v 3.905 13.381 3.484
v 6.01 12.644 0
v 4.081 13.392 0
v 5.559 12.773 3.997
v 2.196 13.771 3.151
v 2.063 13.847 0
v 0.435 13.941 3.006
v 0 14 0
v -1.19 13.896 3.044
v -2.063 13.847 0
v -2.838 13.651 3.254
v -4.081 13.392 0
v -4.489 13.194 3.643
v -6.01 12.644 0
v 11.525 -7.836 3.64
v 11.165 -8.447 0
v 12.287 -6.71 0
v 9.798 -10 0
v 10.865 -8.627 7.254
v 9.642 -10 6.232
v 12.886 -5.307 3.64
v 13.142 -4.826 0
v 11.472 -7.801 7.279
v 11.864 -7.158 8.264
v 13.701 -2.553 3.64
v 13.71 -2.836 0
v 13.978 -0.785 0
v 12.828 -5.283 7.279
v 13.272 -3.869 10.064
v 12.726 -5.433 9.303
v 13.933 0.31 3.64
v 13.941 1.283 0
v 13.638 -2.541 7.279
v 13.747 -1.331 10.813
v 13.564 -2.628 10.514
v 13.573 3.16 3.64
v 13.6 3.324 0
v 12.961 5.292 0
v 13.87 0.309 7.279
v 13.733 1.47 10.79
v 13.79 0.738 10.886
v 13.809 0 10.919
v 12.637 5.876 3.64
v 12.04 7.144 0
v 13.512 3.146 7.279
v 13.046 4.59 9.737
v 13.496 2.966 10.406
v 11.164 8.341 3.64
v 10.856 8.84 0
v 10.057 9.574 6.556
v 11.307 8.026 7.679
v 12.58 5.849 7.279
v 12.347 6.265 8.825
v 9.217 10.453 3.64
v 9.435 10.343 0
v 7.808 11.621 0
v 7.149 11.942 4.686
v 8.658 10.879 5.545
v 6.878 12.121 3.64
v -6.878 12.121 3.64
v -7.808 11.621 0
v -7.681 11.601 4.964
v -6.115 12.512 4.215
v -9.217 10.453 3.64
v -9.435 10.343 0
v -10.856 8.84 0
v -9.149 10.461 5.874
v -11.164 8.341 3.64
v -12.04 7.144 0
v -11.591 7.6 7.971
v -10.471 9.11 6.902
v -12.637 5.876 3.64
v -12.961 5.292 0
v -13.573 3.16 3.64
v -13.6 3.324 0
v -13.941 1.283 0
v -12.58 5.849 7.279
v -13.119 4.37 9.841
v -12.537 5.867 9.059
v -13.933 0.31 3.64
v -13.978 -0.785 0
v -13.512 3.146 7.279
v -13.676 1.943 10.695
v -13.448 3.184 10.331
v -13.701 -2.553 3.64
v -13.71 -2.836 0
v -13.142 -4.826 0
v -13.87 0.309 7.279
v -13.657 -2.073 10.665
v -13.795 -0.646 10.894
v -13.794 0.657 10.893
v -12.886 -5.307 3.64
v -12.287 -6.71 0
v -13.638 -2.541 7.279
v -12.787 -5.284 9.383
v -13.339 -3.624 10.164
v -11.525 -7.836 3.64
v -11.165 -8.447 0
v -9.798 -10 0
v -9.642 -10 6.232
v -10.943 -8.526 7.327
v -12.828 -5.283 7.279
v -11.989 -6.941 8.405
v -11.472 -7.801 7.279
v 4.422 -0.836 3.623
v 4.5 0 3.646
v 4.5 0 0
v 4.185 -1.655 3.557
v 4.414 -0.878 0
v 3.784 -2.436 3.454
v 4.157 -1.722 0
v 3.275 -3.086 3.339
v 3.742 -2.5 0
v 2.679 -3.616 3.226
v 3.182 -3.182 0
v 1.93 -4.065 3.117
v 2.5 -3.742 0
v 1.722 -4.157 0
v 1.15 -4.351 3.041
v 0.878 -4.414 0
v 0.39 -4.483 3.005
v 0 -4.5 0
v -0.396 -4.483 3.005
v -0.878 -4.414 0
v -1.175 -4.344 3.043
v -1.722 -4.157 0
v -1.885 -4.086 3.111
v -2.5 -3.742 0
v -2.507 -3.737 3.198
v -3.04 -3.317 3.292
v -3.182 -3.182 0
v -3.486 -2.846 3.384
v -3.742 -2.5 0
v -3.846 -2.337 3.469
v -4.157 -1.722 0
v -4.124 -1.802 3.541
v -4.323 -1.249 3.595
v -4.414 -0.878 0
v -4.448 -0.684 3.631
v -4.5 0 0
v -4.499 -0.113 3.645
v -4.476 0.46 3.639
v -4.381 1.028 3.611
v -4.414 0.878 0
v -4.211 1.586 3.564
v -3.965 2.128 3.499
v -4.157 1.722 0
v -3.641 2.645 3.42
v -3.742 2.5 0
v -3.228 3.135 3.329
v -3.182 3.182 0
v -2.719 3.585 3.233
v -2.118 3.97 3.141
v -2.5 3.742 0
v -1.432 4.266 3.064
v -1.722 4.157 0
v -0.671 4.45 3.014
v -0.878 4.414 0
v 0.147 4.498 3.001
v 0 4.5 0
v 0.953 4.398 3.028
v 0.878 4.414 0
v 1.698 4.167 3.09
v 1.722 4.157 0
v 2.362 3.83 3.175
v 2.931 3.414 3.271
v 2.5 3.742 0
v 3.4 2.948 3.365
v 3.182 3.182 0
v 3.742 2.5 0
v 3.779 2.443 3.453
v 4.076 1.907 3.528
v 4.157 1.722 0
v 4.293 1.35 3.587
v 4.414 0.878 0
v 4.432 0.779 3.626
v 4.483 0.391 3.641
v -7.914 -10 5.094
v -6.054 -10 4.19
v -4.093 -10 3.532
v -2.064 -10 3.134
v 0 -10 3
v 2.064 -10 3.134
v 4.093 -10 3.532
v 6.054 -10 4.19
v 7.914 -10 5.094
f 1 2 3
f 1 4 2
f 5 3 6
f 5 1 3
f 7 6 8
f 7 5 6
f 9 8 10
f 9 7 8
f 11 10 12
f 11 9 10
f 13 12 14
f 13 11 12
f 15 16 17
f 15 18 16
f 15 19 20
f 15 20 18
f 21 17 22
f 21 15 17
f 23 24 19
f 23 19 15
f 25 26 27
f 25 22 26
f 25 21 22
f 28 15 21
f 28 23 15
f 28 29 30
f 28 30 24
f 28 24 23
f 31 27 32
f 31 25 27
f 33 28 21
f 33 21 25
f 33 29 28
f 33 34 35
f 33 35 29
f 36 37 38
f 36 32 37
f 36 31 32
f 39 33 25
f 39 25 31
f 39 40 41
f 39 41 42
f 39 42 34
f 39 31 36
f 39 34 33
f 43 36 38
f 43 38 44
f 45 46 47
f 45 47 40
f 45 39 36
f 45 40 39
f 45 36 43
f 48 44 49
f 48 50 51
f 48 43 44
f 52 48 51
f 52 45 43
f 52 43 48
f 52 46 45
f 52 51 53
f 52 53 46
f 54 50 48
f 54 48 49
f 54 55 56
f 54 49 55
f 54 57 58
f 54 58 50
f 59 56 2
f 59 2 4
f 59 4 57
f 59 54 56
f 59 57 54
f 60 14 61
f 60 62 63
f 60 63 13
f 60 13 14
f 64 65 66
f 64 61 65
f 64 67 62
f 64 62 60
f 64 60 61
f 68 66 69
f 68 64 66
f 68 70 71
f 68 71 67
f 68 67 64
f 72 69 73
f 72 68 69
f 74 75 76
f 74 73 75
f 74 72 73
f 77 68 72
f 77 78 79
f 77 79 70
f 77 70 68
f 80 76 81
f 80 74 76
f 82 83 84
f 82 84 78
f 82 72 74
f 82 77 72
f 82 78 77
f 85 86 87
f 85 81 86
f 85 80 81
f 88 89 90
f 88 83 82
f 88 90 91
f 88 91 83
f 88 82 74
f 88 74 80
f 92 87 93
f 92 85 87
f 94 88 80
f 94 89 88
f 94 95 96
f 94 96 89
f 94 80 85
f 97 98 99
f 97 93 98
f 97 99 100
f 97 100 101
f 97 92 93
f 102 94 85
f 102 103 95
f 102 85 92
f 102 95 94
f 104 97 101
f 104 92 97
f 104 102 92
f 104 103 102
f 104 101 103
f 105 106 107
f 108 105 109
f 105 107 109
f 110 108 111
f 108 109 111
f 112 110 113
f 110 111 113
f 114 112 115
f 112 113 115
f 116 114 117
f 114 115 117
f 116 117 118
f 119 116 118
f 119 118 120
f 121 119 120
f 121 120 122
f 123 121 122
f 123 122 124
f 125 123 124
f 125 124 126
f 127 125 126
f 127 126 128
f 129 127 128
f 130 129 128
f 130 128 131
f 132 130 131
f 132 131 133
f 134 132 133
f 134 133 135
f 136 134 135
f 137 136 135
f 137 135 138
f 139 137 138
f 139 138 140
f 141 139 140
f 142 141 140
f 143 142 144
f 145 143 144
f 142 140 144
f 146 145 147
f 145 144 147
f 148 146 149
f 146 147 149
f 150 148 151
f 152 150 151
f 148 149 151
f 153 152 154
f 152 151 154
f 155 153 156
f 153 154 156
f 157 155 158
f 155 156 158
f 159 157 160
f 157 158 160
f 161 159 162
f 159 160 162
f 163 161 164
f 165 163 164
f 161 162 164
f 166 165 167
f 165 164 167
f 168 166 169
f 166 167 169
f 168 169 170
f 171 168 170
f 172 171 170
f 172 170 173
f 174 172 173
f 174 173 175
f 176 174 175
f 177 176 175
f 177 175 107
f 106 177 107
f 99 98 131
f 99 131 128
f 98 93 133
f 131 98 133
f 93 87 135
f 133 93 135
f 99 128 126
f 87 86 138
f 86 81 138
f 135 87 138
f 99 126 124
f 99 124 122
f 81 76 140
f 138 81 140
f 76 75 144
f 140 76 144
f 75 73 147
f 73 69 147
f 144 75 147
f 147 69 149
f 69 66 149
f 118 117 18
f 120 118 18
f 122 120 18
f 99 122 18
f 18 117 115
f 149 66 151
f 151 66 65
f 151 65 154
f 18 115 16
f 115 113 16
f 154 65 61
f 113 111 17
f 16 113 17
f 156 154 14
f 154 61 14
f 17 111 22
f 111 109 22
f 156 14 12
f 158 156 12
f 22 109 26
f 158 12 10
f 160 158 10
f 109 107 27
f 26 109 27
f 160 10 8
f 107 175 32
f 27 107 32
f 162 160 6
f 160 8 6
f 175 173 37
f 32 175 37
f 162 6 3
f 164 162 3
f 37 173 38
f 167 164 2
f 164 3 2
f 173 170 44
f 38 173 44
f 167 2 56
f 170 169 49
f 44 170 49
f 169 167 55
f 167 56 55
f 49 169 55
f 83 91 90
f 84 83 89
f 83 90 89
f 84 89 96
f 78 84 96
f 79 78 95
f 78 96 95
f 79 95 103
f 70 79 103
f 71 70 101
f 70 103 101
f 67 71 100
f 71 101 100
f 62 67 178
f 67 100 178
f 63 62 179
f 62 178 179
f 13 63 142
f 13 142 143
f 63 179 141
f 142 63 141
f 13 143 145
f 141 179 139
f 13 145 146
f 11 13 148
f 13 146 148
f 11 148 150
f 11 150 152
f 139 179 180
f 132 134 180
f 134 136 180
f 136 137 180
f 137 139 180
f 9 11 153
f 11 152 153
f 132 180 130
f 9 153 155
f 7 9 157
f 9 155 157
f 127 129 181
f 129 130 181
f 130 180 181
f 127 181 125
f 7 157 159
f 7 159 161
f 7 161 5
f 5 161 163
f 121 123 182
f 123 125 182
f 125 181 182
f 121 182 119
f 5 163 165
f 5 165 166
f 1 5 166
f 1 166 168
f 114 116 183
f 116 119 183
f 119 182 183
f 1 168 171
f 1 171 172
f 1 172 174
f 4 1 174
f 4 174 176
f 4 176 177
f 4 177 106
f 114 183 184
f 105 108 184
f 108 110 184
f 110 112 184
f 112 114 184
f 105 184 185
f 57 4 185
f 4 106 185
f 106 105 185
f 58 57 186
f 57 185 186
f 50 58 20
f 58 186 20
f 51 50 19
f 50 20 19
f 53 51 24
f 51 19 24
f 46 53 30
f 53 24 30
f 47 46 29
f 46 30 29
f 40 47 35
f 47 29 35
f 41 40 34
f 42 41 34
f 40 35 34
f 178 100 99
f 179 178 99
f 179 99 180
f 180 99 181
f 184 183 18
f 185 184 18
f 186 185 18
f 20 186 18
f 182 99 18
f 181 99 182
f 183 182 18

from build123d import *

# Parameters (mm, degrees)
F0_R     = 14
F1_DEPTH = 12
F1_TAPER = 1
F2_R     = 16
F3_DEPTH = 16
F4_R     = 4.5
F5_DEPTH = 5
F7_DEPTH = 10.9201391502


with BuildPart() as f1:
    # F0 (on Top) → F1 (new body)
    with BuildSketch(Plane.XY):
        Circle(F0_R)
    extrude(amount=F1_DEPTH, taper=F1_TAPER)

    # F2 (on Front) → F3 (cut, symmetric)
    with BuildSketch(Plane.XZ):
        with Locations((0, 19)):
            Circle(F2_R)
    extrude(amount=F3_DEPTH, both=True, mode=Mode.SUBTRACT)

    # F4 (on face) → F5 (cut)
    with BuildSketch(Plane(origin=(0, 0, 0), x_dir=(1, 0, 0), z_dir=(0, 0, -1))):
        Circle(F4_R)
    extrude(amount=-F5_DEPTH, mode=Mode.SUBTRACT)

    # F6 (on face) → F7 (cut, through all)
    with BuildSketch(Plane(origin=(0, 0, 0), x_dir=(1, 0, 0), z_dir=(0, 0, -1))):
        with BuildLine():
            ThreePointArc((9.7979589711, 10), (0, 14), (-9.7979589711, 10))
            Line((-9.7979589711, 10), (9.7979589711, 10))
        make_face()
    extrude(amount=-F7_DEPTH, mode=Mode.SUBTRACT)


solid = f1.part
